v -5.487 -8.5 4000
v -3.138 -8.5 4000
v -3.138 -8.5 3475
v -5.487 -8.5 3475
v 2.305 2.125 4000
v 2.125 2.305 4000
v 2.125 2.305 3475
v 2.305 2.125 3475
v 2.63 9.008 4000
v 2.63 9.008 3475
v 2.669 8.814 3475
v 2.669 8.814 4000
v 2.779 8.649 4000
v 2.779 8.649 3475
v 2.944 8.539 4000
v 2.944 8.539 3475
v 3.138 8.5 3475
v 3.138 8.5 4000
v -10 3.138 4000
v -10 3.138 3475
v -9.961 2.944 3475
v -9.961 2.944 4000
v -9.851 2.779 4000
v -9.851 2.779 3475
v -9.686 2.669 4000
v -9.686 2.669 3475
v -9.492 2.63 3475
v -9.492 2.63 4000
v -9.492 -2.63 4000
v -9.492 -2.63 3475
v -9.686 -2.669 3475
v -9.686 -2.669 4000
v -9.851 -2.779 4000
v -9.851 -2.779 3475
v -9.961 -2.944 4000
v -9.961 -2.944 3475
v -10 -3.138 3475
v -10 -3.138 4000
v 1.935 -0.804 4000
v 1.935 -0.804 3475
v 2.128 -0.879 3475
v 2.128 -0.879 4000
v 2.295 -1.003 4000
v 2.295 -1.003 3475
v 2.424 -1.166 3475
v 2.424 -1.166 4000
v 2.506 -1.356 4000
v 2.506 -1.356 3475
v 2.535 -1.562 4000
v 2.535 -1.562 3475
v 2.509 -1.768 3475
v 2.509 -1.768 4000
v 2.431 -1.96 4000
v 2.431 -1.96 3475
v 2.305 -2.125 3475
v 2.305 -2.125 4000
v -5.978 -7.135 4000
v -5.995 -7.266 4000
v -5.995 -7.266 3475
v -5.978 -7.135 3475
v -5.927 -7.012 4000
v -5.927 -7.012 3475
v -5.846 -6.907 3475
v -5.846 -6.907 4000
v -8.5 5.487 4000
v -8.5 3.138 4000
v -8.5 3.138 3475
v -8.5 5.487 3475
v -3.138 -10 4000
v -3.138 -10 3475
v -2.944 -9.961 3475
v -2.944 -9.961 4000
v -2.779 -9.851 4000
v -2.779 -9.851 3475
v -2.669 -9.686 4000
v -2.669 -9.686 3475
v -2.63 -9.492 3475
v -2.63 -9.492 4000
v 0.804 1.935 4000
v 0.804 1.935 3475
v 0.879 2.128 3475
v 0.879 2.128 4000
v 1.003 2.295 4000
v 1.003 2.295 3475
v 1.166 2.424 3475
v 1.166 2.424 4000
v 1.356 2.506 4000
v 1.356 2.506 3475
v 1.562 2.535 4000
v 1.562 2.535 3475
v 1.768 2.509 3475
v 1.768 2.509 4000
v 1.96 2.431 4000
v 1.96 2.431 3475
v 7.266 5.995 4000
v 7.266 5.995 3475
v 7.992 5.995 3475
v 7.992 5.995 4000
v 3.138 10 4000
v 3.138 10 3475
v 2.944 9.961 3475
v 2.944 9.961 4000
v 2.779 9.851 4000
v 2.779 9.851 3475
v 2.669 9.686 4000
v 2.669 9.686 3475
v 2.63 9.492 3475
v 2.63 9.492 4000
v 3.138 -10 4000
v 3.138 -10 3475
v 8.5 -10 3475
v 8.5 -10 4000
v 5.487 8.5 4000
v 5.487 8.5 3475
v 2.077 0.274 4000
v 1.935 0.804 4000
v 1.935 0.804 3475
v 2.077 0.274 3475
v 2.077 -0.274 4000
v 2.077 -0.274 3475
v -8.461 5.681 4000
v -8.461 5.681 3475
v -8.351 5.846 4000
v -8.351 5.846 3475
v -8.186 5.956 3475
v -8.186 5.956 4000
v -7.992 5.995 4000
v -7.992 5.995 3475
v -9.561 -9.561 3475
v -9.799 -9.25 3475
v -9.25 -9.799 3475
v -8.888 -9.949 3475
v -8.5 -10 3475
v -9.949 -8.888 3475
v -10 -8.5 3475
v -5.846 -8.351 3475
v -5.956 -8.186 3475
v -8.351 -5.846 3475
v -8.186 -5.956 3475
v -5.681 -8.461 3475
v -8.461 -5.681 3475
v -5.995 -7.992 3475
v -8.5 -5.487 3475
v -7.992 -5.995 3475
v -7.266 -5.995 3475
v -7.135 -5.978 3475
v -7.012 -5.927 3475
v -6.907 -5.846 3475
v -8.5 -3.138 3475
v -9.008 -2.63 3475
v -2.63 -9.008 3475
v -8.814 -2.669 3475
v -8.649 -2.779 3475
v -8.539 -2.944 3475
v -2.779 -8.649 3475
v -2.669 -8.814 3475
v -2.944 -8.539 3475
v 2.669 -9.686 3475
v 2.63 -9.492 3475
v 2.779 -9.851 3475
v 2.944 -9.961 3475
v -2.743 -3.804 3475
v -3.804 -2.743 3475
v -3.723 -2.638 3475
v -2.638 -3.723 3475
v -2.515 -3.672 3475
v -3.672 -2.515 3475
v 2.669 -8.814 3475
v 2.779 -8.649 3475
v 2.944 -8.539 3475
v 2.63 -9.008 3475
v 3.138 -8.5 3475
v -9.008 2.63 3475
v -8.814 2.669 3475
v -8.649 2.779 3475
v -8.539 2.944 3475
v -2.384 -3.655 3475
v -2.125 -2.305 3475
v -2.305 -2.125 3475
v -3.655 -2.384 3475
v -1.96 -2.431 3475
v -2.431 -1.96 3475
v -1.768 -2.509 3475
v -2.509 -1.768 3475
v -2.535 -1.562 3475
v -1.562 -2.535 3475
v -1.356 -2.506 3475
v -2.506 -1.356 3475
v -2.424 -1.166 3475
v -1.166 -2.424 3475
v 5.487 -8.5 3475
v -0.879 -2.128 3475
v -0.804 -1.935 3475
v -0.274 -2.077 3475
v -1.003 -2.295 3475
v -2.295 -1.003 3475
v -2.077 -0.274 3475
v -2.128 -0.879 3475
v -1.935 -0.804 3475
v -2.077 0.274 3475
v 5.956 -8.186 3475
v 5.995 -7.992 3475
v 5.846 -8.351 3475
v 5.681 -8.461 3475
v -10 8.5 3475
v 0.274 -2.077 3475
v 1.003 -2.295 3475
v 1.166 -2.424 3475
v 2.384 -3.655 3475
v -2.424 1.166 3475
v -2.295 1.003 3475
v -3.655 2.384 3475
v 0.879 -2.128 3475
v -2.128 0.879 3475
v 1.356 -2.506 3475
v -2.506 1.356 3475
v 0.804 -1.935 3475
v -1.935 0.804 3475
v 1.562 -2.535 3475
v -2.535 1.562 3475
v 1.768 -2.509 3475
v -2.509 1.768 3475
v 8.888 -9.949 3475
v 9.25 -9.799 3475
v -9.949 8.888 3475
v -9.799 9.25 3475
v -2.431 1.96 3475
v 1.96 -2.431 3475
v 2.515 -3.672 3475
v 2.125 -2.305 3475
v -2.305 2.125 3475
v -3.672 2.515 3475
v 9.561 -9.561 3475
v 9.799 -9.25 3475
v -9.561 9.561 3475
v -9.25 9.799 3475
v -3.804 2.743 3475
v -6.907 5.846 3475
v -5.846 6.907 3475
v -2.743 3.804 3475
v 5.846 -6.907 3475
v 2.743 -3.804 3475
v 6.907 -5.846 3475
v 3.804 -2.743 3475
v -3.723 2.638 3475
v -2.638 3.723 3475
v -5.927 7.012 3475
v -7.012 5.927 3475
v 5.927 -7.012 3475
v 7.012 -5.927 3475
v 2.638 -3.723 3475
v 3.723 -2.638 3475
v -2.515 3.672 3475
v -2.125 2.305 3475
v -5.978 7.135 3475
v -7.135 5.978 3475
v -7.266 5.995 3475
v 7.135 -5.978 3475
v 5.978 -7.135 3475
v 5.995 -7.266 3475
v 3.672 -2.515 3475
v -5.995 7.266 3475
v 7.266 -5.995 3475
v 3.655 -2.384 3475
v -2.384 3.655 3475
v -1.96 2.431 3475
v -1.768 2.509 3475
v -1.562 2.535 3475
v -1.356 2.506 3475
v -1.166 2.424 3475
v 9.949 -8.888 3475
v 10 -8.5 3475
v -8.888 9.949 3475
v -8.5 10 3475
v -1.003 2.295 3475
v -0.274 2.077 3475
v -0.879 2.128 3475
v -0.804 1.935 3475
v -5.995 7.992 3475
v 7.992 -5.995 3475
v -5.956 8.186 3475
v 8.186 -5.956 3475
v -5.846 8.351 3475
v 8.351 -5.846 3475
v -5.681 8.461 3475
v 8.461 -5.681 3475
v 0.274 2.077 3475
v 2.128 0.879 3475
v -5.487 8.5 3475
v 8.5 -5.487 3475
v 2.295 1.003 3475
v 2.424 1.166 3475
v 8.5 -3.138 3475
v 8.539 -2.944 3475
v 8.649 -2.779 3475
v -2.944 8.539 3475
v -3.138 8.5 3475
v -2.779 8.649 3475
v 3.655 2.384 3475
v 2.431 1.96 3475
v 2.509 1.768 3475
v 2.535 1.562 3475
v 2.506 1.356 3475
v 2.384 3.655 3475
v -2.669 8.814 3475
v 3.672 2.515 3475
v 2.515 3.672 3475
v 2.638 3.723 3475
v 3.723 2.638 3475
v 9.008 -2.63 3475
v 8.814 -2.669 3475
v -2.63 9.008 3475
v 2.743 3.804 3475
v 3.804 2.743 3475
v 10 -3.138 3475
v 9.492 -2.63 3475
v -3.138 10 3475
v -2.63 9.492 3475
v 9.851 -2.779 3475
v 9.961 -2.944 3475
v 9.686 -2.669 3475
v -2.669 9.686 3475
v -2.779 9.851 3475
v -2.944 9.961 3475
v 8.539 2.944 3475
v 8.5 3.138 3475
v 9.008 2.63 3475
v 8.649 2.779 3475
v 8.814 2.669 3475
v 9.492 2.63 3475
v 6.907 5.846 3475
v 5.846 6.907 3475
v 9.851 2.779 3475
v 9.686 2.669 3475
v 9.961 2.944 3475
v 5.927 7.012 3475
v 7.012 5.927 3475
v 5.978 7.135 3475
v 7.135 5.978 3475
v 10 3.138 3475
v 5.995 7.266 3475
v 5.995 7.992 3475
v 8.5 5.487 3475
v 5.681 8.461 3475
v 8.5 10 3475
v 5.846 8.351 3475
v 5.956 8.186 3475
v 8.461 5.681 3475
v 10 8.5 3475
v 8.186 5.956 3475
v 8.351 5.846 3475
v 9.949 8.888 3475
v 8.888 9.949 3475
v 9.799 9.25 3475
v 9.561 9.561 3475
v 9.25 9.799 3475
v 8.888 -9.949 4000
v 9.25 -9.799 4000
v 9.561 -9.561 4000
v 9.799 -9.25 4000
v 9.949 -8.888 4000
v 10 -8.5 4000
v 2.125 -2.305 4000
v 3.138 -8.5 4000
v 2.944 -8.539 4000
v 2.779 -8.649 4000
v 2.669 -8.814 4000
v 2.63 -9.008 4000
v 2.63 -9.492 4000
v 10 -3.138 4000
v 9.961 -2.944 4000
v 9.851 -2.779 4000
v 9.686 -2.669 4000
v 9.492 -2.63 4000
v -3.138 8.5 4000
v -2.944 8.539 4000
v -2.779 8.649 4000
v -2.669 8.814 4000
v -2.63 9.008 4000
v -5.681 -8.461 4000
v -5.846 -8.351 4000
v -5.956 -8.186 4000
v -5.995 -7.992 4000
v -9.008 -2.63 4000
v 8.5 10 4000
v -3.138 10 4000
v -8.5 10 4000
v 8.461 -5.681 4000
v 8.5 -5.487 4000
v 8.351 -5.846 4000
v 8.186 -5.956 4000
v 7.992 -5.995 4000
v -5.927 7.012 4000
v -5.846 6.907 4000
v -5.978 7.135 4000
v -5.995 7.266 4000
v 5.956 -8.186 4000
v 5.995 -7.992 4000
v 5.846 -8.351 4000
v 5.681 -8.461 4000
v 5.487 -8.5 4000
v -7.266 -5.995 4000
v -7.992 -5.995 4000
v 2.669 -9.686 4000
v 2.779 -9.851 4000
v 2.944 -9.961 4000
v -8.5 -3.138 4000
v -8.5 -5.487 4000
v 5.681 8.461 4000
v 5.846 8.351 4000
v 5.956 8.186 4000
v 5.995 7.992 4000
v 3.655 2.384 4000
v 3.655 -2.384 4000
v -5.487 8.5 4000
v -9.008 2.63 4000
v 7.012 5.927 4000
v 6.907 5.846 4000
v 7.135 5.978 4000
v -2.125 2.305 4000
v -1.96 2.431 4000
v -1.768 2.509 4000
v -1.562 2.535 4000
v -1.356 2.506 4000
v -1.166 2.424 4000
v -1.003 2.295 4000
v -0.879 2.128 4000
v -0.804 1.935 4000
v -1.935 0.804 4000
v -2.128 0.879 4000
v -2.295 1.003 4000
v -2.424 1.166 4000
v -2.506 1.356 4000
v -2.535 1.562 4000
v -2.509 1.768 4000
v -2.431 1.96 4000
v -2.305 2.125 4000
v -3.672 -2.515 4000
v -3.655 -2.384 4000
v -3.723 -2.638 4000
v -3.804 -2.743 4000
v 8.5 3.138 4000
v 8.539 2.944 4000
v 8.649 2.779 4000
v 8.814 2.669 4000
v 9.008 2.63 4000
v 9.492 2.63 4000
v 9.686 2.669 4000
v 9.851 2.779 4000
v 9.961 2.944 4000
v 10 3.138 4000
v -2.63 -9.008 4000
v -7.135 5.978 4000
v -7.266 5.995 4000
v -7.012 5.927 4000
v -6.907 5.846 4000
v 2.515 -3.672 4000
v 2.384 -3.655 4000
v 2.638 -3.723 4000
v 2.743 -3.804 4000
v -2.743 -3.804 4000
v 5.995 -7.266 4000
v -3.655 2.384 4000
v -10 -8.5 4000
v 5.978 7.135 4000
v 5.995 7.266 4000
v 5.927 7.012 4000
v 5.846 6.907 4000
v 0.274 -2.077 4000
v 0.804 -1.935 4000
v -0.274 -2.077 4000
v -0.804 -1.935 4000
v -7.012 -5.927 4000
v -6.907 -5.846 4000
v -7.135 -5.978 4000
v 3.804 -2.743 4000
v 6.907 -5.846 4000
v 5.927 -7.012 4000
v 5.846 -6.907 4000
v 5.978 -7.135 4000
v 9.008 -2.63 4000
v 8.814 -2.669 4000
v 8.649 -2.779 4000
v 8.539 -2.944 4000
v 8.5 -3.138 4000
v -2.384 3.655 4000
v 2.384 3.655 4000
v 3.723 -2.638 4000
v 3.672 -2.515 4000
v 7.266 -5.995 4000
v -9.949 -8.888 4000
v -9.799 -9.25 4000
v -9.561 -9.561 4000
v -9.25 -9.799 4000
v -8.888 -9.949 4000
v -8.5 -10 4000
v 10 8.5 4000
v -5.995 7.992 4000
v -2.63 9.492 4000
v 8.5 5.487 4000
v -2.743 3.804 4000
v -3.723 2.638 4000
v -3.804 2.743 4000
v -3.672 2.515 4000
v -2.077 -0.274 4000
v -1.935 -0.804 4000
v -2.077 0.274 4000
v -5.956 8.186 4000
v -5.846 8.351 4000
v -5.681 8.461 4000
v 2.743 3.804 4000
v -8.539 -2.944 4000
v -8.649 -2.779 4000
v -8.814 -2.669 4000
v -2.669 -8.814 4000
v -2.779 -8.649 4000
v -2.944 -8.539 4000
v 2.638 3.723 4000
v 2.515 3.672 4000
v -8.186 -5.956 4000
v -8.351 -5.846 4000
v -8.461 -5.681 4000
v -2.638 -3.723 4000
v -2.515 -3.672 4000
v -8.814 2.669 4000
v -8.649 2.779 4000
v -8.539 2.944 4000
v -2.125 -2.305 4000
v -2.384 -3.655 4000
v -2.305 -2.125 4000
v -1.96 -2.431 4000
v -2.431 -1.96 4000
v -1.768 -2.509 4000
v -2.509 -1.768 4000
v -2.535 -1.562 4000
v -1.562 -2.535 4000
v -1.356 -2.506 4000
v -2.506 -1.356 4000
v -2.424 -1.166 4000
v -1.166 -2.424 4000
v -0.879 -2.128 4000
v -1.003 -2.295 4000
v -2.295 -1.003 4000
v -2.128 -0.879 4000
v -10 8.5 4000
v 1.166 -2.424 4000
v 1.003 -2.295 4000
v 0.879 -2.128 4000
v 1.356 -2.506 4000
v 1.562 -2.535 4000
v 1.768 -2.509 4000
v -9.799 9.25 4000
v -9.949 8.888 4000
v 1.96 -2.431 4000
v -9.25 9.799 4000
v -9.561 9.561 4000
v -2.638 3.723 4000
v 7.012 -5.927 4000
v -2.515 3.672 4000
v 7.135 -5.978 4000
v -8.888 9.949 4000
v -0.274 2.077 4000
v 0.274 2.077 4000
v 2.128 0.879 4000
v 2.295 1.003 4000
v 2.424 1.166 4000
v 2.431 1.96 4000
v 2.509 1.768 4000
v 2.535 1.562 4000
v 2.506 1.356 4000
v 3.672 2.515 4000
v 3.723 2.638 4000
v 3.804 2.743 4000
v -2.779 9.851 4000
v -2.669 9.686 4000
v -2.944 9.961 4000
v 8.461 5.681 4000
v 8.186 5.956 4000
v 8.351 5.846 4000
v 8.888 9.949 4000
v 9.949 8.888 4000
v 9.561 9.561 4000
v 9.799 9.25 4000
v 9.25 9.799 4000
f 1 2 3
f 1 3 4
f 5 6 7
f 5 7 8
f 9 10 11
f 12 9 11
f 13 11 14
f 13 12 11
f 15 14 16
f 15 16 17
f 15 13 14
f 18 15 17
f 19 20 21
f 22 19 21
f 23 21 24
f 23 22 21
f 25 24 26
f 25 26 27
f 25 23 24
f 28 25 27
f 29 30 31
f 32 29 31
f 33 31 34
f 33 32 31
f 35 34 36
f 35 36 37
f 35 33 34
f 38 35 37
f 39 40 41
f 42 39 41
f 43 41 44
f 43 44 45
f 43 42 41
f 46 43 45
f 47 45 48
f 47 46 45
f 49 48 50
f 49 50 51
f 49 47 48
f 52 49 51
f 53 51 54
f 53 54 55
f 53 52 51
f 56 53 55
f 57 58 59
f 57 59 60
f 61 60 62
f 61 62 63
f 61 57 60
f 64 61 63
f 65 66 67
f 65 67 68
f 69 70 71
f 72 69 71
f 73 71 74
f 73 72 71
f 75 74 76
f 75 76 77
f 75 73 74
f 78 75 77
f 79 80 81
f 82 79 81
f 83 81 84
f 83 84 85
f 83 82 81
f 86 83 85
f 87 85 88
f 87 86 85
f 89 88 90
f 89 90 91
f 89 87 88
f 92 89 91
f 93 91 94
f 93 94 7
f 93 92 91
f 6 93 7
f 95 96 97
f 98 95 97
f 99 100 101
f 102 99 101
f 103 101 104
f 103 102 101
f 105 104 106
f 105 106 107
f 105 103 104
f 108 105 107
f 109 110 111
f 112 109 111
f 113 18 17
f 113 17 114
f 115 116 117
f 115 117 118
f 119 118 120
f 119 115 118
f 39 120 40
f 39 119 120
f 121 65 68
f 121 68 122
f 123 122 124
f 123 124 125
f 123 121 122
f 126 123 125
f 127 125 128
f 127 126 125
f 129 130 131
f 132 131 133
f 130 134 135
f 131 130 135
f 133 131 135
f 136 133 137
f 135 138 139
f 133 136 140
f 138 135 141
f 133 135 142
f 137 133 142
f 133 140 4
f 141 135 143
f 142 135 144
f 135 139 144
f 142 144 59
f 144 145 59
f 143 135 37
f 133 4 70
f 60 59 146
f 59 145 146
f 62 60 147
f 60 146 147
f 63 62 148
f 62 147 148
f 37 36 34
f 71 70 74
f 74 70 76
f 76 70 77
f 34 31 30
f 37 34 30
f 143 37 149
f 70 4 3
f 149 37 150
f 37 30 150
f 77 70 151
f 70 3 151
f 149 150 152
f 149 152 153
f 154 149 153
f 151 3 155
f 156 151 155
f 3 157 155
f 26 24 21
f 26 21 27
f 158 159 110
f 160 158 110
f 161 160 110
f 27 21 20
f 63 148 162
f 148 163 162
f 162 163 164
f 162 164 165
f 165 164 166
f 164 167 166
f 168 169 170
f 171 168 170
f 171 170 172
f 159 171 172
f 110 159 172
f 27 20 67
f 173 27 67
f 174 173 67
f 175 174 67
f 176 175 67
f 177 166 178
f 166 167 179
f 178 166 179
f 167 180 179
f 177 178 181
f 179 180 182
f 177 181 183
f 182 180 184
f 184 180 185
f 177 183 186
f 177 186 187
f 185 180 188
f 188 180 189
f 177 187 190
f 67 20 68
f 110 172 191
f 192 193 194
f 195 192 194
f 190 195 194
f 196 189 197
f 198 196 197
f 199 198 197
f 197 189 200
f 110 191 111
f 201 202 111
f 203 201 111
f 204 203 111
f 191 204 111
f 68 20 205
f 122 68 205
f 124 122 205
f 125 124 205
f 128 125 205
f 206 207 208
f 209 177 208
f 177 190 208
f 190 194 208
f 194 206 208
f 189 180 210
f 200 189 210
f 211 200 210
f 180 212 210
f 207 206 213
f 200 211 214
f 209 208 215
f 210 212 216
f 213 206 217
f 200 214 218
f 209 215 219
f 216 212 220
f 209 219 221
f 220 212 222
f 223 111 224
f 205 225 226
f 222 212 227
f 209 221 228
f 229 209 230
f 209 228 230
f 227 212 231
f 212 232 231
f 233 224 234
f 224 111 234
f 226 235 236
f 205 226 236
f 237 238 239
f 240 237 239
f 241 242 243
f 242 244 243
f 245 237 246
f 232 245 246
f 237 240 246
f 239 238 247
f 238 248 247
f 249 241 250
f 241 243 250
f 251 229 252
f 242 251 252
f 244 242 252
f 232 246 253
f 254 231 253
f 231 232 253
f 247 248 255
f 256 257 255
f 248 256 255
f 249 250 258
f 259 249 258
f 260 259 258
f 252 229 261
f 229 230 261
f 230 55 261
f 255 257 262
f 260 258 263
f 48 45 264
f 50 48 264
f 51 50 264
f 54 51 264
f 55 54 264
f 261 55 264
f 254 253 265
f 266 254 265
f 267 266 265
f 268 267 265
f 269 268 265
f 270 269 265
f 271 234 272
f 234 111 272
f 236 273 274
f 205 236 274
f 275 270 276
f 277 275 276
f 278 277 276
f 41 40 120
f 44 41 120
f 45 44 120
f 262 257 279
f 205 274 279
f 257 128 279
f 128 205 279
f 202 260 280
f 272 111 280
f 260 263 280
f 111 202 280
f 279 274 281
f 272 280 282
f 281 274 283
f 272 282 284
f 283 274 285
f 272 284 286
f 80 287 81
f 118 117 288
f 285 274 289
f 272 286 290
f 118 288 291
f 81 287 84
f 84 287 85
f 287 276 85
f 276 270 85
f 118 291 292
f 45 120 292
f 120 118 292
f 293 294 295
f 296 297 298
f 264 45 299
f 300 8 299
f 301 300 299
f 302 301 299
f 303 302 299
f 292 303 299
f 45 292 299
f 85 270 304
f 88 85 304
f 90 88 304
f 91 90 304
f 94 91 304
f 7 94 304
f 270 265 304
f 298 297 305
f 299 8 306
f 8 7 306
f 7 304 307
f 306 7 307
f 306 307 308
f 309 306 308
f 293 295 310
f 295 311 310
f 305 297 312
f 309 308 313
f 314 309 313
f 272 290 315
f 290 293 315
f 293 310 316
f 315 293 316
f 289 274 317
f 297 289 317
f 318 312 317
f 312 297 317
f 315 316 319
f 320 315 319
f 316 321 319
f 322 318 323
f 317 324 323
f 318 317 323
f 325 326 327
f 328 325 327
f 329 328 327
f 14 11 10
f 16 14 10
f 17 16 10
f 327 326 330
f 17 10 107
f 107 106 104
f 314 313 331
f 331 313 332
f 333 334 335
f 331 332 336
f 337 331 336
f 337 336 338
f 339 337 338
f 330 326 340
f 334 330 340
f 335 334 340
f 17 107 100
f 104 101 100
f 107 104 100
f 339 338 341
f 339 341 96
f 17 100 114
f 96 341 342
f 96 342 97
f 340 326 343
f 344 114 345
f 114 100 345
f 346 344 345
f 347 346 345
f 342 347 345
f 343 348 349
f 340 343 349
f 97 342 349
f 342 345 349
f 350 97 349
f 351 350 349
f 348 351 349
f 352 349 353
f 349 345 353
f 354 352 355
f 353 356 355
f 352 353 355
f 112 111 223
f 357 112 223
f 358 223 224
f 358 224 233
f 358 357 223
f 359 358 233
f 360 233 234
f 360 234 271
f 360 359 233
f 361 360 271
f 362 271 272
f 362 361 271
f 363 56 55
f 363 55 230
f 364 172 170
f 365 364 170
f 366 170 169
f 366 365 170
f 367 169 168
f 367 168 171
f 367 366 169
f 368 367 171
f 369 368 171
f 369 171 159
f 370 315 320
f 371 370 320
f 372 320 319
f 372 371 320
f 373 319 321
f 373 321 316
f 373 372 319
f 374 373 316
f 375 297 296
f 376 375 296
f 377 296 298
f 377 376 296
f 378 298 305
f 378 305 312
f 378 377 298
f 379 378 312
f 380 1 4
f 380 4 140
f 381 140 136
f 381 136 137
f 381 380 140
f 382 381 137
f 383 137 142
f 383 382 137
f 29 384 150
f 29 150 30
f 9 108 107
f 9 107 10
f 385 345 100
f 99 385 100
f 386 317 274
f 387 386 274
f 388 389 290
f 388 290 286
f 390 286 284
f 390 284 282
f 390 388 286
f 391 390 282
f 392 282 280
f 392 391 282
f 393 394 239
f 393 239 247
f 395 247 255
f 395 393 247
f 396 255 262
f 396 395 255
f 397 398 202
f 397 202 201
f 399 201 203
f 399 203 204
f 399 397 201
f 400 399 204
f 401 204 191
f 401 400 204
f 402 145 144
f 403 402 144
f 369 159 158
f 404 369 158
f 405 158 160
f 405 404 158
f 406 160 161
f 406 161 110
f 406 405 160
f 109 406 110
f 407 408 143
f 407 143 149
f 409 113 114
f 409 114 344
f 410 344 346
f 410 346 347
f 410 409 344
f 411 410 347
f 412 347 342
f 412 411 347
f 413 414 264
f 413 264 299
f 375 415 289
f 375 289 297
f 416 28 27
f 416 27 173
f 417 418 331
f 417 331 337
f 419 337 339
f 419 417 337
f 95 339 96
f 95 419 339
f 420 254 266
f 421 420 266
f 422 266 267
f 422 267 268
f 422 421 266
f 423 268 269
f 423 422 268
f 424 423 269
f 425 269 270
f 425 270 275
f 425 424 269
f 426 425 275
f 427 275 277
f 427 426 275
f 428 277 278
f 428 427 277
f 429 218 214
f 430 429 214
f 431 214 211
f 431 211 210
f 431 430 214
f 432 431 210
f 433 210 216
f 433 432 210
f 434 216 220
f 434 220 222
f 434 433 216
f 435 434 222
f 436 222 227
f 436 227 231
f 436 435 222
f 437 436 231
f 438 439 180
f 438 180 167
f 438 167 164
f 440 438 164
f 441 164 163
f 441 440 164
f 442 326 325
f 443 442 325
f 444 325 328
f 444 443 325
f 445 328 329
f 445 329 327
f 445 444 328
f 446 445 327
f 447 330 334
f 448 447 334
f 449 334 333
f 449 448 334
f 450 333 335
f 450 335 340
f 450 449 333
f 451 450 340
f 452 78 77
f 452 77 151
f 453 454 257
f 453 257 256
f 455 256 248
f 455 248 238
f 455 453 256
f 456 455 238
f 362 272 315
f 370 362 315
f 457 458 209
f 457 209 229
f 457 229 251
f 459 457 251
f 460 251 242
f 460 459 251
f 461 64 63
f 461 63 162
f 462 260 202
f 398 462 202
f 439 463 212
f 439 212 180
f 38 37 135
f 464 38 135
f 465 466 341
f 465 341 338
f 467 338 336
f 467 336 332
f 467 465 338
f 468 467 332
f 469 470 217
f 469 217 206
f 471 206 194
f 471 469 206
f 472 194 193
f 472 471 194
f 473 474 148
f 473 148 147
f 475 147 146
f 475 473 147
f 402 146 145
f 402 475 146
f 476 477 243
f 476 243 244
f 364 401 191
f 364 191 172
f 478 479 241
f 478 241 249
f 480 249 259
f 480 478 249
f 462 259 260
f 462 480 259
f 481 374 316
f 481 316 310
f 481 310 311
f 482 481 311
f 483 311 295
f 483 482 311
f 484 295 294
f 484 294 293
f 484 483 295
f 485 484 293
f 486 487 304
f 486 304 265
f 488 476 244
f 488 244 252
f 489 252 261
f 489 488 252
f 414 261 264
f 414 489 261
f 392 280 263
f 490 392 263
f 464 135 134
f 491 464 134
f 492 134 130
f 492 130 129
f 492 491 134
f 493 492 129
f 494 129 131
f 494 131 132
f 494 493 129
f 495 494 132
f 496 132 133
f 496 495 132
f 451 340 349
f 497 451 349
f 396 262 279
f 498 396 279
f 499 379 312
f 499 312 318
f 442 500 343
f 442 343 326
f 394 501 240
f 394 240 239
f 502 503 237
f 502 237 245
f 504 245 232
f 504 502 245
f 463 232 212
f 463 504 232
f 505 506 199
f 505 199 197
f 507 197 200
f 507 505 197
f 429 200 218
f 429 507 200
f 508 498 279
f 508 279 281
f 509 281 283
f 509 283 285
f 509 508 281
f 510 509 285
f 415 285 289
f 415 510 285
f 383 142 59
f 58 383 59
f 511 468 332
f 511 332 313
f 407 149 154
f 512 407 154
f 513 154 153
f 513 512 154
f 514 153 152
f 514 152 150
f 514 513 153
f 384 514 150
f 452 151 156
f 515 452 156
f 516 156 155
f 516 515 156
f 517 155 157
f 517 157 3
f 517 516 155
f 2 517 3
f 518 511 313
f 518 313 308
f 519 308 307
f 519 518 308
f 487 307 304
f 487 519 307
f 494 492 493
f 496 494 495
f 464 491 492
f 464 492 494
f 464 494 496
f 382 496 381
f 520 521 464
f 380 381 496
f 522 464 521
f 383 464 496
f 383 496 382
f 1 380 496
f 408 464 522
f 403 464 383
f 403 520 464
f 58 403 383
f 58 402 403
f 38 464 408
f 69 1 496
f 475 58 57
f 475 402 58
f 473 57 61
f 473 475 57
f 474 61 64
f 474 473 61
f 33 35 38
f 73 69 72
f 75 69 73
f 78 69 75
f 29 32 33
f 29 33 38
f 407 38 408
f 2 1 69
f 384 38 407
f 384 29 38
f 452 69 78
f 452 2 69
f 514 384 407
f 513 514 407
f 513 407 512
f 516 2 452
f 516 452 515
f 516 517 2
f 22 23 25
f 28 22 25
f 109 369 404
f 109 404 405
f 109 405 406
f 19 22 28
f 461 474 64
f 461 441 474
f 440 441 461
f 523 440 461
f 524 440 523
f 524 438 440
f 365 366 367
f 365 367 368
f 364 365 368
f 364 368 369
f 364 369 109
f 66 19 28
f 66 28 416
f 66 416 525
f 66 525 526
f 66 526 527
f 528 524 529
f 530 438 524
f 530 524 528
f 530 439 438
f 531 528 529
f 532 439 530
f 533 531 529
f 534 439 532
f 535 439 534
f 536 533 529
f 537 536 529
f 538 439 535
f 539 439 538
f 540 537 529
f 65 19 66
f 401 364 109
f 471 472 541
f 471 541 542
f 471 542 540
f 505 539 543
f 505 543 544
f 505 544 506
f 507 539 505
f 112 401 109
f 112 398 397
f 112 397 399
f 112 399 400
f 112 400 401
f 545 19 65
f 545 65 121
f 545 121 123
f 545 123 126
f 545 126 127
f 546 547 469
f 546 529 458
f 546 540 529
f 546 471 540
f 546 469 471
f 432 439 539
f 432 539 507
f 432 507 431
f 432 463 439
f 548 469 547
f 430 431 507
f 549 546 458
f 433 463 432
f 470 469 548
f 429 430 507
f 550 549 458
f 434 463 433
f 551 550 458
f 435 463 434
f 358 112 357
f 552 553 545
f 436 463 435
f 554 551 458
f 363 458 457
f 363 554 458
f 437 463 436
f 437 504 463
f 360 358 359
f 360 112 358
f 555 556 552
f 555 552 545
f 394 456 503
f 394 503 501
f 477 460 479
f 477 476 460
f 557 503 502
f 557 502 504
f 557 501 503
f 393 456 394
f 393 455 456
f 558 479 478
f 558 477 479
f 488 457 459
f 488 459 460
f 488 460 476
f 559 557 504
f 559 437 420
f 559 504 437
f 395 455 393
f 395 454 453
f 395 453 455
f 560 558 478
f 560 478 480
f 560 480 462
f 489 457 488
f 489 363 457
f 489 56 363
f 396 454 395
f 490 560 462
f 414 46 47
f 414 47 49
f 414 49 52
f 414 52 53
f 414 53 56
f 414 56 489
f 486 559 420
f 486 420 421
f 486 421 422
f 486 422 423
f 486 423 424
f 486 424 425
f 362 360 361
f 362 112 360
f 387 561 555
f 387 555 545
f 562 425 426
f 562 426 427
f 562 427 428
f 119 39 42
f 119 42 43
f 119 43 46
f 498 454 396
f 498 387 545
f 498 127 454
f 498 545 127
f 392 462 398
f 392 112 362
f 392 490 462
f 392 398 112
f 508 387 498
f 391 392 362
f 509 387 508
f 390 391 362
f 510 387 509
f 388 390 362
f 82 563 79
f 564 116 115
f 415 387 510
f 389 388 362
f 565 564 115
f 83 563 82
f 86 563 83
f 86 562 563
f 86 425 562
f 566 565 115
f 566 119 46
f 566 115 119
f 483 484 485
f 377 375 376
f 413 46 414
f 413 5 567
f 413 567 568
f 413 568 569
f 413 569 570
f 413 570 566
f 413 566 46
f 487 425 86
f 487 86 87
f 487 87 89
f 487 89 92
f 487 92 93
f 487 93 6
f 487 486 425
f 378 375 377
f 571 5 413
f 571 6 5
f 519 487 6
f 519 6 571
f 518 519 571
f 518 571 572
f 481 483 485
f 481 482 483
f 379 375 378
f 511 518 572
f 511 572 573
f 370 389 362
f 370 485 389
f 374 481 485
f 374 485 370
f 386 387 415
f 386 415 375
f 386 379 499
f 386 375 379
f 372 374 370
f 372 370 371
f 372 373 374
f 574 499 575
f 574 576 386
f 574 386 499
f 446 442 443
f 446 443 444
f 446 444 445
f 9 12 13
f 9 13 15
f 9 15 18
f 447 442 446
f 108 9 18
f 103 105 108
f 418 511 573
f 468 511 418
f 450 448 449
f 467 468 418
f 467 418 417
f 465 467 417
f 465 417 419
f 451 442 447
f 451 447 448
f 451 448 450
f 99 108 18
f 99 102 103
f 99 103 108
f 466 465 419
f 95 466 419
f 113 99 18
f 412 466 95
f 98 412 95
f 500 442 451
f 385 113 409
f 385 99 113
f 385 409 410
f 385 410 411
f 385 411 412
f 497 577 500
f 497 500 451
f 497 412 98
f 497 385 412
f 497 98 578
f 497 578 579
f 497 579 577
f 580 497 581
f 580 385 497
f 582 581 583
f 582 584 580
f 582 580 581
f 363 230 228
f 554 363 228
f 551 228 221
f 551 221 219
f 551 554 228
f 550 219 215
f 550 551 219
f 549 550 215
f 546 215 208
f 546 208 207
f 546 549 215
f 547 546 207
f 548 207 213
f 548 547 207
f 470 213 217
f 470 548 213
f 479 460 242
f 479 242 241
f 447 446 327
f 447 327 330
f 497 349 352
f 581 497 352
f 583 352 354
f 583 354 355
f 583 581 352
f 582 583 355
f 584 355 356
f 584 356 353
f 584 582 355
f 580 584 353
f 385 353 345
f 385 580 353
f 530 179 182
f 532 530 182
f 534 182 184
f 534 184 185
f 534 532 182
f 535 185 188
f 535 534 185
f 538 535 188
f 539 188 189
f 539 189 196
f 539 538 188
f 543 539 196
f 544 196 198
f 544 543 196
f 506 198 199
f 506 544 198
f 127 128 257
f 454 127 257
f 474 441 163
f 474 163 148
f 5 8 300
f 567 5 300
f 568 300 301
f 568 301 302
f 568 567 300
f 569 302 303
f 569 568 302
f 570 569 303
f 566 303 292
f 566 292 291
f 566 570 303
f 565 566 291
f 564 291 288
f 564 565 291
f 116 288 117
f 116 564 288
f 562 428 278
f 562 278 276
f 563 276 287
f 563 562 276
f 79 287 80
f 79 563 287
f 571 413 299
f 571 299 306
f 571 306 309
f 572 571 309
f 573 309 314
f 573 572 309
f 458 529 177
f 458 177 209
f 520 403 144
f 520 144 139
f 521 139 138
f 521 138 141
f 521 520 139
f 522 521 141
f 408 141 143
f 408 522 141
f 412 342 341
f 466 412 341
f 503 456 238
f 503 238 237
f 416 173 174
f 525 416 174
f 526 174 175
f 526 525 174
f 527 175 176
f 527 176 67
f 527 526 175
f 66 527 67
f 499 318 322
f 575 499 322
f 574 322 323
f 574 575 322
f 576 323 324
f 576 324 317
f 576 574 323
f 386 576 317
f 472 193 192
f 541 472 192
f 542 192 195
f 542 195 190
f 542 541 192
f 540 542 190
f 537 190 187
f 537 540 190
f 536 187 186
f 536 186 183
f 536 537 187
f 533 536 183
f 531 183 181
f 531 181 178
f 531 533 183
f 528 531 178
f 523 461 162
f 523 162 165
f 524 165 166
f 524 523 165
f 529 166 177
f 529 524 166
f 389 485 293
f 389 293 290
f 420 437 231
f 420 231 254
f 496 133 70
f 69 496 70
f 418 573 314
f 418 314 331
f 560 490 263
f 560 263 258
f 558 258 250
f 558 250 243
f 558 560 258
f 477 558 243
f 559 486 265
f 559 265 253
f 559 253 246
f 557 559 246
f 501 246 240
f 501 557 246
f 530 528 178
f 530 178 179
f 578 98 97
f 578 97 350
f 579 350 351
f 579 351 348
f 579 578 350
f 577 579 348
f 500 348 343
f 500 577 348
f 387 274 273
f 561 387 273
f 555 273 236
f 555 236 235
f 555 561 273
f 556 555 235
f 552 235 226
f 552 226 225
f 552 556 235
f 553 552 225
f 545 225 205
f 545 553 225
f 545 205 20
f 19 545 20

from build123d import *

# Parameters (mm, degrees)
BOSS_EXTRUDE1_DEPTH = 525


with BuildPart() as part:
    # Sketch1 → Boss-Extrude1 (new body)
    with BuildSketch(Plane.XY.offset(4000)):
        with BuildLine():
            Line((10, 3.138), (10, 8.5))
            ThreePointArc((10, 8.5), (9.560660172, 9.560660172), (8.5, 10))
            Line((8.5, 10), (3.138, 10))
            ThreePointArc((3.138, 10), (2.778789755, 9.851210245), (2.63, 9.492))
            Line((2.63, 9.492), (2.63, 9.008))
            ThreePointArc((2.63, 9.008), (2.778789755, 8.648789755), (3.138, 8.5))
            Line((3.138, 8.5), (5.487, 8.5))
            ThreePointArc((5.487, 8.5), (5.846210245, 8.351210245), (5.995, 7.992))
            Line((5.995, 7.992), (5.995, 7.266080661))
            ThreePointArc((5.995, 7.266080661), (5.956330803, 7.071677478), (5.846210245, 6.906870417))
            Line((5.846210245, 6.906870417), (2.743129583, 3.803789755))
            ThreePointArc((2.743129583, 3.803789755), (2.578322522, 3.693669197), (2.383919339, 3.655))
            Line((2.383919339, 3.655), (-2.383919339, 3.655))
            ThreePointArc((-2.383919339, 3.655), (-2.578322522, 3.693669197), (-2.743129583, 3.803789755))
            Line((-2.743129583, 3.803789755), (-5.846210245, 6.906870417))
            ThreePointArc((-5.846210245, 6.906870417), (-5.956330803, 7.071677478), (-5.995, 7.266080661))
            Line((-5.995, 7.266080661), (-5.995, 7.992))
            ThreePointArc((-5.995, 7.992), (-5.846210245, 8.351210245), (-5.487, 8.5))
            Line((-5.487, 8.5), (-3.138, 8.5))
            ThreePointArc((-3.138, 8.5), (-2.778789755, 8.648789755), (-2.63, 9.008))
            Line((-2.63, 9.008), (-2.63, 9.492))
            ThreePointArc((-2.63, 9.492), (-2.778789755, 9.851210245), (-3.138, 10))
            Line((-3.138, 10), (-8.5, 10))
            ThreePointArc((-8.5, 10), (-9.560660172, 9.560660172), (-10, 8.5))
            Line((-10, 8.5), (-10, 3.138))
            ThreePointArc((-10, 3.138), (-9.851210245, 2.778789755), (-9.492, 2.63))
            Line((-9.492, 2.63), (-9.008, 2.63))
            ThreePointArc((-9.008, 2.63), (-8.648789755, 2.778789755), (-8.5, 3.138))
            Line((-8.5, 3.138), (-8.5, 5.487))
            ThreePointArc((-8.5, 5.487), (-8.351210245, 5.846210245), (-7.992, 5.995))
            Line((-7.992, 5.995), (-7.266080661, 5.995))
            ThreePointArc((-7.266080661, 5.995), (-7.071677478, 5.956330803), (-6.906870417, 5.846210245))
            Line((-6.906870417, 5.846210245), (-3.803789755, 2.743129583))
            ThreePointArc((-3.803789755, 2.743129583), (-3.693669197, 2.578322522), (-3.655, 2.383919339))
            Line((-3.655, 2.383919339), (-3.655, -2.383919339))
            ThreePointArc((-3.655, -2.383919339), (-3.693669197, -2.578322522), (-3.803789755, -2.743129583))
            Line((-3.803789755, -2.743129583), (-6.906870417, -5.846210245))
            ThreePointArc((-6.906870417, -5.846210245), (-7.071677478, -5.956330803), (-7.266080661, -5.995))
            Line((-7.266080661, -5.995), (-7.992, -5.995))
            ThreePointArc((-7.992, -5.995), (-8.351210245, -5.846210245), (-8.5, -5.487))
            Line((-8.5, -5.487), (-8.5, -3.138))
            ThreePointArc((-8.5, -3.138), (-8.648789755, -2.778789755), (-9.008, -2.63))
            Line((-9.008, -2.63), (-9.492, -2.63))
            ThreePointArc((-9.492, -2.63), (-9.851210245, -2.778789755), (-10, -3.138))
            Line((-10, -3.138), (-10, -8.5))
            ThreePointArc((-10, -8.5), (-9.560660172, -9.560660172), (-8.5, -10))
            Line((-8.5, -10), (-3.138, -10))
            ThreePointArc((-3.138, -10), (-2.778789755, -9.851210245), (-2.63, -9.492))
            Line((-2.63, -9.492), (-2.63, -9.008))
            ThreePointArc((-2.63, -9.008), (-2.778789755, -8.648789755), (-3.138, -8.5))
            Line((-3.138, -8.5), (-5.487, -8.5))
            ThreePointArc((-5.487, -8.5), (-5.846210245, -8.351210245), (-5.995, -7.992))
            Line((-5.995, -7.992), (-5.995, -7.266080661))
            ThreePointArc((-5.995, -7.266080661), (-5.956330803, -7.071677478), (-5.846210245, -6.906870417))
            Line((-5.846210245, -6.906870417), (-2.743129583, -3.803789755))
            ThreePointArc((-2.743129583, -3.803789755), (-2.578322522, -3.693669197), (-2.383919339, -3.655))
            Line((-2.383919339, -3.655), (2.383919339, -3.655))
            ThreePointArc((2.383919339, -3.655), (2.578322522, -3.693669197), (2.743129583, -3.803789755))
            Line((2.743129583, -3.803789755), (5.846210245, -6.906870417))
            ThreePointArc((5.846210245, -6.906870417), (5.956330803, -7.071677478), (5.995, -7.266080661))
            Line((5.995, -7.266080661), (5.995, -7.992))
            ThreePointArc((5.995, -7.992), (5.846210245, -8.351210245), (5.487, -8.5))
            Line((5.487, -8.5), (3.138, -8.5))
            ThreePointArc((3.138, -8.5), (2.778789755, -8.648789755), (2.63, -9.008))
            Line((2.63, -9.008), (2.63, -9.492))
            ThreePointArc((2.63, -9.492), (2.778789755, -9.851210245), (3.138, -10))
            Line((3.138, -10), (8.5, -10))
            ThreePointArc((8.5, -10), (9.560660172, -9.560660172), (10, -8.5))
            Line((10, -8.5), (10, -3.138))
            ThreePointArc((10, -3.138), (9.851210245, -2.778789755), (9.492, -2.63))
            Line((9.492, -2.63), (9.008, -2.63))
            ThreePointArc((9.008, -2.63), (8.648789755, -2.778789755), (8.5, -3.138))
            Line((8.5, -3.138), (8.5, -5.487))
            ThreePointArc((8.5, -5.487), (8.351210245, -5.846210245), (7.992, -5.995))
            Line((7.992, -5.995), (7.266080661, -5.995))
            ThreePointArc((7.266080661, -5.995), (7.071677478, -5.956330803), (6.906870417, -5.846210245))
            Line((6.906870417, -5.846210245), (3.803789755, -2.743129583))
            ThreePointArc((3.803789755, -2.743129583), (3.693669197, -2.578322522), (3.655, -2.383919339))
            Line((3.655, -2.383919339), (3.655, 2.383919339))
            ThreePointArc((3.655, 2.383919339), (3.693669197, 2.578322522), (3.803789755, 2.743129583))
            Line((3.803789755, 2.743129583), (6.906870417, 5.846210245))
            ThreePointArc((6.906870417, 5.846210245), (7.071677478, 5.956330803), (7.266080661, 5.995))
            Line((7.266080661, 5.995), (7.992, 5.995))
            ThreePointArc((7.992, 5.995), (8.351210245, 5.846210245), (8.5, 5.487))
            Line((8.5, 5.487), (8.5, 3.138))
            ThreePointArc((8.5, 3.138), (8.648789755, 2.778789755), (9.008, 2.63))
            Line((9.008, 2.63), (9.492, 2.63))
            ThreePointArc((9.492, 2.63), (9.851210245, 2.778789755), (10, 3.138))
        make_face()
        with BuildLine():
            Line((-2.124900844, -2.304505966), (-2.304505966, -2.124900844))
            ThreePointArc((-2.304505966, -2.124900844), (-2.505938017, -1.356467811), (-1.935133506, -0.803976718))
            ThreePointArc((-1.935133506, -0.803976718), (-2.0955, 0), (-1.935133506, 0.803976718))
            ThreePointArc((-1.935133506, 0.803976718), (-2.505938017, 1.356467811), (-2.304505966, 2.124900844))
            Line((-2.304505966, 2.124900844), (-2.124900844, 2.304505966))
            ThreePointArc((-2.124900844, 2.304505966), (-1.356467811, 2.505938017), (-0.803976718, 1.935133506))
            ThreePointArc((-0.803976718, 1.935133506), (0, 2.0955), (0.803976718, 1.935133506))
            ThreePointArc((0.803976718, 1.935133506), (1.356467811, 2.505938017), (2.124900844, 2.304505966))
            Line((2.124900844, 2.304505966), (2.304505966, 2.124900844))
            ThreePointArc((2.304505966, 2.124900844), (2.505938017, 1.356467811), (1.935133506, 0.803976718))
            ThreePointArc((1.935133506, 0.803976718), (2.0955, 0), (1.935133506, -0.803976718))
            ThreePointArc((1.935133506, -0.803976718), (2.505938017, -1.356467811), (2.304505966, -2.124900844))
            Line((2.304505966, -2.124900844), (2.124900844, -2.304505966))
            ThreePointArc((2.124900844, -2.304505966), (1.356467811, -2.505938017), (0.803976718, -1.935133506))
            ThreePointArc((0.803976718, -1.935133506), (0, -2.0955), (-0.803976718, -1.935133506))
            ThreePointArc((-0.803976718, -1.935133506), (-1.356467811, -2.505938017), (-2.124900844, -2.304505966))
        make_face(mode=Mode.SUBTRACT)
    extrude(amount=-BOSS_EXTRUDE1_DEPTH)


solid = part.part
